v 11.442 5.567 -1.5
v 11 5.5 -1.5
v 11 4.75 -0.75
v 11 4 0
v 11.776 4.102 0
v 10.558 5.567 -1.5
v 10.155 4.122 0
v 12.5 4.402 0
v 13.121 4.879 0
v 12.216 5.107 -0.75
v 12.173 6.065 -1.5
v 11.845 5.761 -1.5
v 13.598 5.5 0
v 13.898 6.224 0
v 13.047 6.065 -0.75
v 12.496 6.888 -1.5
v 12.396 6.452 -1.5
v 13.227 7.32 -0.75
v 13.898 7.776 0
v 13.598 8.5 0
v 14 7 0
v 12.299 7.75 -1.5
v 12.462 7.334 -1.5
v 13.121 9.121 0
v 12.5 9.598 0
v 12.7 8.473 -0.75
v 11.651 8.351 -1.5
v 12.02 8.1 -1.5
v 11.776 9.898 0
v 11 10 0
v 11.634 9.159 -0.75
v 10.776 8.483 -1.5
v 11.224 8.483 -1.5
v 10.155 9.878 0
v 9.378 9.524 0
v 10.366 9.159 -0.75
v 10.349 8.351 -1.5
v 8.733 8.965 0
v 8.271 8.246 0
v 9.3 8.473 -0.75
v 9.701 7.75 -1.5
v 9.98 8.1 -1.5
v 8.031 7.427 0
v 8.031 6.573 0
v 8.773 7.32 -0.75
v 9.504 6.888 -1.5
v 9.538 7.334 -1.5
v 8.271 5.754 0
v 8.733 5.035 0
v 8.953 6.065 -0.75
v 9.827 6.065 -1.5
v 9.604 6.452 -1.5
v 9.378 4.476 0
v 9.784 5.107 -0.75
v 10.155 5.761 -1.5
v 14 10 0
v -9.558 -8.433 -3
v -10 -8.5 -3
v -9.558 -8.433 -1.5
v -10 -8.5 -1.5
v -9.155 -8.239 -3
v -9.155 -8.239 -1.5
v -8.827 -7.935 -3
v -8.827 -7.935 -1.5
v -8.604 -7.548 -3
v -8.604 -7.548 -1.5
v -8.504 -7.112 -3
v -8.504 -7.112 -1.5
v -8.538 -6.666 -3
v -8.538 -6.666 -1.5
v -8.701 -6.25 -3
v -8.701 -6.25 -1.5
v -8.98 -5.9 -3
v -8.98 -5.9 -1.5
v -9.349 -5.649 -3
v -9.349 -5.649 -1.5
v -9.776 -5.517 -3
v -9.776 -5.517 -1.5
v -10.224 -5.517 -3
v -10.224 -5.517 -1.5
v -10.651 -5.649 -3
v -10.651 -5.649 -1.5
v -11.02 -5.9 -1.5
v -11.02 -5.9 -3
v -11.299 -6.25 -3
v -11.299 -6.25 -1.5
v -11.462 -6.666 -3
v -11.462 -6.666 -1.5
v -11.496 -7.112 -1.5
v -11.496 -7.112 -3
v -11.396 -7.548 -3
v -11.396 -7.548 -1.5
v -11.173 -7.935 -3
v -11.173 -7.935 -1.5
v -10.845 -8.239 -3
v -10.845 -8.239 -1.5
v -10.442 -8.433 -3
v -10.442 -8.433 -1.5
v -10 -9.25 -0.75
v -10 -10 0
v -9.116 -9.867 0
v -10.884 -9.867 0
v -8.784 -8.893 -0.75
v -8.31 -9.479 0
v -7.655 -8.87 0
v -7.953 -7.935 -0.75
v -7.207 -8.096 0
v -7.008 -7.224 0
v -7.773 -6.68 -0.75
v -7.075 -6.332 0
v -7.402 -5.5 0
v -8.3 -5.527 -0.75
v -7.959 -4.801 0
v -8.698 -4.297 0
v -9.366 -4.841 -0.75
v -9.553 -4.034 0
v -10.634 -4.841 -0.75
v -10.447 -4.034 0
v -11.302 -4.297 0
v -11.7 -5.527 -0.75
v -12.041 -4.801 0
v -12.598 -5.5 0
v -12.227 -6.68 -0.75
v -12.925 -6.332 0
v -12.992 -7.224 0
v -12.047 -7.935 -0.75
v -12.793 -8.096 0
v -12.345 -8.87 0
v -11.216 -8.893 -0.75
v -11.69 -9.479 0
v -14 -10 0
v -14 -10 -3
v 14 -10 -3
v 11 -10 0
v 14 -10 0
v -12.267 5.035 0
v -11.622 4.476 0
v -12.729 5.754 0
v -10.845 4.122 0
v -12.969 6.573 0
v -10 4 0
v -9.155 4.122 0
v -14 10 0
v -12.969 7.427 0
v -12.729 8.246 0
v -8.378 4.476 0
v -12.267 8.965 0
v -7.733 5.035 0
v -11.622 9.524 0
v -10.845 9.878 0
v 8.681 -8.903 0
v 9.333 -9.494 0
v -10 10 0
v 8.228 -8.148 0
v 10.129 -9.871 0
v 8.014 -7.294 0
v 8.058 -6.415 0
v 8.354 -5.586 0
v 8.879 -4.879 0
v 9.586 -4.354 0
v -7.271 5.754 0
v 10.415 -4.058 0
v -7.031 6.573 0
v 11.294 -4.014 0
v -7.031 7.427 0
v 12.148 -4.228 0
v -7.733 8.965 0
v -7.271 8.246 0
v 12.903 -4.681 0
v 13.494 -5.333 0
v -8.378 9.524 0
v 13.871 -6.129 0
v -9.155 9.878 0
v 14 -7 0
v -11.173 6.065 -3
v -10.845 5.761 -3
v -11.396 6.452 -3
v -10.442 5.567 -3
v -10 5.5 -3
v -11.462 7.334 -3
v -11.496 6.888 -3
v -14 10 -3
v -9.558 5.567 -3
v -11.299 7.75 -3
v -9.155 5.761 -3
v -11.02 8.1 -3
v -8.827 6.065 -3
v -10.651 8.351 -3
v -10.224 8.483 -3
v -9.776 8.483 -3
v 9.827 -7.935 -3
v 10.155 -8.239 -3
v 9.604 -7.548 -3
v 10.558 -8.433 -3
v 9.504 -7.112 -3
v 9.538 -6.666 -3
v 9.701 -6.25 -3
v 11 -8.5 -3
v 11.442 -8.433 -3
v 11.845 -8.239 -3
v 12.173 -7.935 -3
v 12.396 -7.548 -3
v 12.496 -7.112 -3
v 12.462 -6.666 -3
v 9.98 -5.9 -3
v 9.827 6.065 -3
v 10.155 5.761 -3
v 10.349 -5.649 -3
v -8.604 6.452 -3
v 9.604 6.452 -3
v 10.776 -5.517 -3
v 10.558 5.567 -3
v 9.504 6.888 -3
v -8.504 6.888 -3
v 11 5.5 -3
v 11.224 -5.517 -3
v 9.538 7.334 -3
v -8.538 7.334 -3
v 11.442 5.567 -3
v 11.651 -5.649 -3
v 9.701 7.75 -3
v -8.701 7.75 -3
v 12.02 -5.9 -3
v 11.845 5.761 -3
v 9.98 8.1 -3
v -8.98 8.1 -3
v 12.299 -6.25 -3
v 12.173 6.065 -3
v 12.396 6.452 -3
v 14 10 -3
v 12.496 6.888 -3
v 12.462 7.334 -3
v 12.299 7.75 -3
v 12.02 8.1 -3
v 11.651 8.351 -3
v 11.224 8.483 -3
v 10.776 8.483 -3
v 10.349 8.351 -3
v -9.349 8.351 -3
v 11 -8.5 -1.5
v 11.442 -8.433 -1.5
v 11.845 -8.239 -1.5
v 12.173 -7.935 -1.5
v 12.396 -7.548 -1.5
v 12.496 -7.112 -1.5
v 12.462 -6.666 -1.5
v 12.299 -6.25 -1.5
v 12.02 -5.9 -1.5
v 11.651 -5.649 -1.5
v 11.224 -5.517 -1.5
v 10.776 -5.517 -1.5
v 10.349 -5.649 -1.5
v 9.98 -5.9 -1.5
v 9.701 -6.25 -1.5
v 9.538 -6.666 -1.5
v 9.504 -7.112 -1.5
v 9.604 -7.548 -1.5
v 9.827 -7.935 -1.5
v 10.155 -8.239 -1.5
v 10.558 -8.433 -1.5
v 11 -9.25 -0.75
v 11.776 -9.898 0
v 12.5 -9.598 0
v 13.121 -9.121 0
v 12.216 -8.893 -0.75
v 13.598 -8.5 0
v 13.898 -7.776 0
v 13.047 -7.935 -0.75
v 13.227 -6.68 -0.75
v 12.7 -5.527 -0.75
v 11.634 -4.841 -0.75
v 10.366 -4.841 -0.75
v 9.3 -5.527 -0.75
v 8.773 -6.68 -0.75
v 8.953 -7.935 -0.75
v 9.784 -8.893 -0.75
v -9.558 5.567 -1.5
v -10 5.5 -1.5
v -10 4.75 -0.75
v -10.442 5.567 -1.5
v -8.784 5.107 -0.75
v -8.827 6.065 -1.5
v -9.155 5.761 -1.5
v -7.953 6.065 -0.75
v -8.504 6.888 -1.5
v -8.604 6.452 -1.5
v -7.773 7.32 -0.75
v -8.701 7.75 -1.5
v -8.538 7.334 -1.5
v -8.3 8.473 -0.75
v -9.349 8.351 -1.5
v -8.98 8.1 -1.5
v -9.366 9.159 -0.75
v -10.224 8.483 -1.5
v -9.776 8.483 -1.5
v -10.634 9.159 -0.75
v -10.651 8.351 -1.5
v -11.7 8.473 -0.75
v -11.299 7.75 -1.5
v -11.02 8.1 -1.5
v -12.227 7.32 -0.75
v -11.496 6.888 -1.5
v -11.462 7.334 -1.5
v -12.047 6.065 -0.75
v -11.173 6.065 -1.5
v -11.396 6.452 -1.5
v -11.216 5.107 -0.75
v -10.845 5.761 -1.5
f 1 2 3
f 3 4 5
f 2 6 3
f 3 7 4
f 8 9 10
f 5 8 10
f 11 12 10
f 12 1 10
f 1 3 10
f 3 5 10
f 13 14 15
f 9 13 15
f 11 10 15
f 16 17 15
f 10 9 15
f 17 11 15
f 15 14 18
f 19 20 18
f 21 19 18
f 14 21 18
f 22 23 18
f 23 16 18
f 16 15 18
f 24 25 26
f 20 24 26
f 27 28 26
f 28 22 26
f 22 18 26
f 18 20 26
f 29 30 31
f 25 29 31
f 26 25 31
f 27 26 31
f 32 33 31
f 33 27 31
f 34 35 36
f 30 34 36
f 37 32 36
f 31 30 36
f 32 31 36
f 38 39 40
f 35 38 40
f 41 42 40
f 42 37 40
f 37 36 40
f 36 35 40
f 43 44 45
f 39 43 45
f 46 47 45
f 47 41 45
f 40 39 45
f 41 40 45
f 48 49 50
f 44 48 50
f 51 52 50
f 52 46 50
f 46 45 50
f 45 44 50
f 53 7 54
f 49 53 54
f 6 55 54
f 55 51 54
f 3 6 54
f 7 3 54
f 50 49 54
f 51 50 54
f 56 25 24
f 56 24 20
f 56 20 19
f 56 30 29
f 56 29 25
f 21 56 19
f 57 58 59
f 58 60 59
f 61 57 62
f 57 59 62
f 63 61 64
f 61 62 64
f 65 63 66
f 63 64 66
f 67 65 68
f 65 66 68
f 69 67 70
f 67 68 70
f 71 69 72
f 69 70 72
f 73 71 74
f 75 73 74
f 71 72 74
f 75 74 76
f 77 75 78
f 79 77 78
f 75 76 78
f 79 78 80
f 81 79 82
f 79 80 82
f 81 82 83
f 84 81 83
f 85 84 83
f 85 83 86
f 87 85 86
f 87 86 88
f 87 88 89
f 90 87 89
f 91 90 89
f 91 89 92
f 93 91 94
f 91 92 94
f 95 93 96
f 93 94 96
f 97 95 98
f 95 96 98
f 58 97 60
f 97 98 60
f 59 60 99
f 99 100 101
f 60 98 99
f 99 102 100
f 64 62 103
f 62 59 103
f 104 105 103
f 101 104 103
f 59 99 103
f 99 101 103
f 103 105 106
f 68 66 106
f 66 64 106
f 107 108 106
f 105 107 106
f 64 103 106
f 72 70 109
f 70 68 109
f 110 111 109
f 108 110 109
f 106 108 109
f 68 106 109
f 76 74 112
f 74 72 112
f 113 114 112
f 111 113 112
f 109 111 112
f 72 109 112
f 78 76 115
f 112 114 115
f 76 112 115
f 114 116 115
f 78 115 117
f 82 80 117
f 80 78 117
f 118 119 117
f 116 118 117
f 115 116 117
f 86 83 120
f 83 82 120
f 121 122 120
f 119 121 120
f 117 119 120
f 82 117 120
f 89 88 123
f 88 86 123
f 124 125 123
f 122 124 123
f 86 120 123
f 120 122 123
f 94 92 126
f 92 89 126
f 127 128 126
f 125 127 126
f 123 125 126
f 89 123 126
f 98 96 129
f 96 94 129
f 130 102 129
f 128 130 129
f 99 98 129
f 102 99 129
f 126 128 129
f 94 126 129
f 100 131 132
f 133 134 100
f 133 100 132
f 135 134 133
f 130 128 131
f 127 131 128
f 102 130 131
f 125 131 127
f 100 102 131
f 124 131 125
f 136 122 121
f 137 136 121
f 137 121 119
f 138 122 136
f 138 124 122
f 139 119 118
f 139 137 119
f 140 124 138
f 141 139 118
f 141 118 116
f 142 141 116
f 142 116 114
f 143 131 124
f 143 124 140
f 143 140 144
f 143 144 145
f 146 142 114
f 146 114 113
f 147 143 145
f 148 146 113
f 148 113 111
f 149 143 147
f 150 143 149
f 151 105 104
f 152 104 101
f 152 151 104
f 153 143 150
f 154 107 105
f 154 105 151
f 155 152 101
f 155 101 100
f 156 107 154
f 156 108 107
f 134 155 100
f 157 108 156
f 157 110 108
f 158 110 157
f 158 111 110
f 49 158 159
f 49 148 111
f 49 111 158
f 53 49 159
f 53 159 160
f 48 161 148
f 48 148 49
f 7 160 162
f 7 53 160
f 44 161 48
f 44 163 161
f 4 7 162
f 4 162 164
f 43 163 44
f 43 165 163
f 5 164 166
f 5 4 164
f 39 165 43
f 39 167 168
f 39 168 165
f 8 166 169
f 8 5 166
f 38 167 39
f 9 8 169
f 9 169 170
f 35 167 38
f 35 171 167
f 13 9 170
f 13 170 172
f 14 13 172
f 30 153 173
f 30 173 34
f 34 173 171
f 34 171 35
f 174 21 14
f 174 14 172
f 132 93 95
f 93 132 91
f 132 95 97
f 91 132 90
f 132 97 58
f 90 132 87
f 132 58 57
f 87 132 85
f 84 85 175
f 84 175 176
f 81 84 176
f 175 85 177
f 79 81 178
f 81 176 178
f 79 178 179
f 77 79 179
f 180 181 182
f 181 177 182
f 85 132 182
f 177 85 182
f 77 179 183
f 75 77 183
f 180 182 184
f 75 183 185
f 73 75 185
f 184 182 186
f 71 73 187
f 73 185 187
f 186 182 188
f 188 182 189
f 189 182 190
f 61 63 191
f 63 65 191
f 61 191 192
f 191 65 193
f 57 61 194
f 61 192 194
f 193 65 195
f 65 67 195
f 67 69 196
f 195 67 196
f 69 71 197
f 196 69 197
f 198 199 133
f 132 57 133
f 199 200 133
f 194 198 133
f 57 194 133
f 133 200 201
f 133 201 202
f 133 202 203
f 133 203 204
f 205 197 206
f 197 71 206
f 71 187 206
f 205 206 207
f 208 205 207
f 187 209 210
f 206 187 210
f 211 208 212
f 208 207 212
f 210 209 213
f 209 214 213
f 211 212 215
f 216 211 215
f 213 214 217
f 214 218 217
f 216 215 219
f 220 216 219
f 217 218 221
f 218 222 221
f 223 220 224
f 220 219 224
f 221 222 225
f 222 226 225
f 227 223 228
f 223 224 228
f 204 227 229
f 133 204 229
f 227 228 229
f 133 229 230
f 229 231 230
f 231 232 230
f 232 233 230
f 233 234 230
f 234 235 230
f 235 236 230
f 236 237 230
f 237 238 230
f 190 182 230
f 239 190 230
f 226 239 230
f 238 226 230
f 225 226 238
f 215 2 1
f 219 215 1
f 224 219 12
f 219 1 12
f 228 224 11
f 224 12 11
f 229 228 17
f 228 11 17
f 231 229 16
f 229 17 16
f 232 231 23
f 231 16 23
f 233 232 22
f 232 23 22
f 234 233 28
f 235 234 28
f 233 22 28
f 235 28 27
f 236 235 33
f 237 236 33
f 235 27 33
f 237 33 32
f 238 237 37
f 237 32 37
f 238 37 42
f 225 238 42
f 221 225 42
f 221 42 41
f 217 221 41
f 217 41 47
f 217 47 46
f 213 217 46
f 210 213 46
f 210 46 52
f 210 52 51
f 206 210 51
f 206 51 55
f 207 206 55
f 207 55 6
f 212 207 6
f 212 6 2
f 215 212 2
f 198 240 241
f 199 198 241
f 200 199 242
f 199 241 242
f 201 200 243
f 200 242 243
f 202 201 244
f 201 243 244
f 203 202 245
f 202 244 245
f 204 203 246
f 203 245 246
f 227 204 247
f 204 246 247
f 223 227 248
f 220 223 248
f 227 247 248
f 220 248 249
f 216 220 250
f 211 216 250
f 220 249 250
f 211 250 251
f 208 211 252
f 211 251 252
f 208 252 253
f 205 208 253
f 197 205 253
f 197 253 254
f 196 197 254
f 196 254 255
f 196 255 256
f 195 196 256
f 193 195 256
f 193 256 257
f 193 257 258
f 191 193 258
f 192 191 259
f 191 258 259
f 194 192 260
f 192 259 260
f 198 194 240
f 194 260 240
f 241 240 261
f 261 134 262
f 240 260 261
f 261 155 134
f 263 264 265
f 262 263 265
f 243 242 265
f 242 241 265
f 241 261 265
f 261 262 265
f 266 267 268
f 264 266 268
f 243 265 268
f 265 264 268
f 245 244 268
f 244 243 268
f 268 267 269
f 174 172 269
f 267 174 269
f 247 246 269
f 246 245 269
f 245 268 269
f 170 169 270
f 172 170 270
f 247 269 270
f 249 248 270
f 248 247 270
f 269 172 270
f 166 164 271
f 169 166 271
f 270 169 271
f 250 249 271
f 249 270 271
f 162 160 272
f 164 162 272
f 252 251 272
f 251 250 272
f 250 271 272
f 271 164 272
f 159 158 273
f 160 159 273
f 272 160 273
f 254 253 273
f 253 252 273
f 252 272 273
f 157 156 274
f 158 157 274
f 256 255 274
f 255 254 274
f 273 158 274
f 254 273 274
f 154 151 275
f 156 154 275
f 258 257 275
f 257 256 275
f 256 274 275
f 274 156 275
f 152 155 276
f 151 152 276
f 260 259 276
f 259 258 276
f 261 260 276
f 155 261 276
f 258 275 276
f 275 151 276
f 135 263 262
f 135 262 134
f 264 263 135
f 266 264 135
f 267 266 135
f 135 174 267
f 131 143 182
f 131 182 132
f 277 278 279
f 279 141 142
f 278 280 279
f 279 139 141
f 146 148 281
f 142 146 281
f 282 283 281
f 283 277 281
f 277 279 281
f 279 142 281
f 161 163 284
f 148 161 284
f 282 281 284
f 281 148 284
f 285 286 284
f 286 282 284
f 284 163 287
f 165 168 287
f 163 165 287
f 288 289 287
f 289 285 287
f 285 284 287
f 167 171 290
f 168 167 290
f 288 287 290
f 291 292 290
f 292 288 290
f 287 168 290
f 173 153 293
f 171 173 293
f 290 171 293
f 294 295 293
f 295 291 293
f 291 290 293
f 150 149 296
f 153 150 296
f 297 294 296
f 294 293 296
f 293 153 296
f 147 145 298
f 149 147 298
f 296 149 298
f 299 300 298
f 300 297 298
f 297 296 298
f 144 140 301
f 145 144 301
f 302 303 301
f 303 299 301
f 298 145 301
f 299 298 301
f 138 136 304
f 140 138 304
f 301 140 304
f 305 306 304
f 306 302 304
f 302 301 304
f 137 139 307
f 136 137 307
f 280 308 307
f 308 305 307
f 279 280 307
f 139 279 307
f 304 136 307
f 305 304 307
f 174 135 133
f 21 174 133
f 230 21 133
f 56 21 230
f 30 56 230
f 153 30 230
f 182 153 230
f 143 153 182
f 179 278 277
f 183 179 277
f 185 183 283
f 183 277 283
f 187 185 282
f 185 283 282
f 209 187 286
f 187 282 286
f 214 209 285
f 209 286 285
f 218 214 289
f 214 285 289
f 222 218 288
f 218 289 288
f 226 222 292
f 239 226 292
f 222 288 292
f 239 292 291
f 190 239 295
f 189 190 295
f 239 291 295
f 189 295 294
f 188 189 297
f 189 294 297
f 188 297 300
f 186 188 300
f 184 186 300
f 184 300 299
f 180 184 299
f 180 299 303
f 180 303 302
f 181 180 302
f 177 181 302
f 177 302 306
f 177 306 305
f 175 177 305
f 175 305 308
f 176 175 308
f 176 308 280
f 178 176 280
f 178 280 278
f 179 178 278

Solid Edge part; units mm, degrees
sketch "Sketch1" plane through (0, 0, 0) normal (0, 0, 1) x (1, 0, 0)
  line L0 (-14, -10) -> (14, -10)
  line L1 (14, -10) -> (14, 10)
  line L2 (14, 10) -> (-14, 10)
  line L3 (-14, 10) -> (-14, -10)
extrude "Protrusion1" add sketch "Sketch1" against normal blind 3
hole "Hole1" at (11, -7, 0) direction (0, 0, -1) diameter 3 end up to next countersink diameter 6 countersink angle 90
hole "Hole2" at (11, 7, 0) direction (0, 0, -1) diameter 3 end up to next countersink diameter 6 countersink angle 90
hole "Hole3" at (-10, 7, 0) direction (0, 0, -1) diameter 3 end up to next countersink diameter 6 countersink angle 90
hole "Hole4" at (-10, -7, 0) direction (0, 0, -1) diameter 3 end up to next countersink diameter 6 countersink angle 90
